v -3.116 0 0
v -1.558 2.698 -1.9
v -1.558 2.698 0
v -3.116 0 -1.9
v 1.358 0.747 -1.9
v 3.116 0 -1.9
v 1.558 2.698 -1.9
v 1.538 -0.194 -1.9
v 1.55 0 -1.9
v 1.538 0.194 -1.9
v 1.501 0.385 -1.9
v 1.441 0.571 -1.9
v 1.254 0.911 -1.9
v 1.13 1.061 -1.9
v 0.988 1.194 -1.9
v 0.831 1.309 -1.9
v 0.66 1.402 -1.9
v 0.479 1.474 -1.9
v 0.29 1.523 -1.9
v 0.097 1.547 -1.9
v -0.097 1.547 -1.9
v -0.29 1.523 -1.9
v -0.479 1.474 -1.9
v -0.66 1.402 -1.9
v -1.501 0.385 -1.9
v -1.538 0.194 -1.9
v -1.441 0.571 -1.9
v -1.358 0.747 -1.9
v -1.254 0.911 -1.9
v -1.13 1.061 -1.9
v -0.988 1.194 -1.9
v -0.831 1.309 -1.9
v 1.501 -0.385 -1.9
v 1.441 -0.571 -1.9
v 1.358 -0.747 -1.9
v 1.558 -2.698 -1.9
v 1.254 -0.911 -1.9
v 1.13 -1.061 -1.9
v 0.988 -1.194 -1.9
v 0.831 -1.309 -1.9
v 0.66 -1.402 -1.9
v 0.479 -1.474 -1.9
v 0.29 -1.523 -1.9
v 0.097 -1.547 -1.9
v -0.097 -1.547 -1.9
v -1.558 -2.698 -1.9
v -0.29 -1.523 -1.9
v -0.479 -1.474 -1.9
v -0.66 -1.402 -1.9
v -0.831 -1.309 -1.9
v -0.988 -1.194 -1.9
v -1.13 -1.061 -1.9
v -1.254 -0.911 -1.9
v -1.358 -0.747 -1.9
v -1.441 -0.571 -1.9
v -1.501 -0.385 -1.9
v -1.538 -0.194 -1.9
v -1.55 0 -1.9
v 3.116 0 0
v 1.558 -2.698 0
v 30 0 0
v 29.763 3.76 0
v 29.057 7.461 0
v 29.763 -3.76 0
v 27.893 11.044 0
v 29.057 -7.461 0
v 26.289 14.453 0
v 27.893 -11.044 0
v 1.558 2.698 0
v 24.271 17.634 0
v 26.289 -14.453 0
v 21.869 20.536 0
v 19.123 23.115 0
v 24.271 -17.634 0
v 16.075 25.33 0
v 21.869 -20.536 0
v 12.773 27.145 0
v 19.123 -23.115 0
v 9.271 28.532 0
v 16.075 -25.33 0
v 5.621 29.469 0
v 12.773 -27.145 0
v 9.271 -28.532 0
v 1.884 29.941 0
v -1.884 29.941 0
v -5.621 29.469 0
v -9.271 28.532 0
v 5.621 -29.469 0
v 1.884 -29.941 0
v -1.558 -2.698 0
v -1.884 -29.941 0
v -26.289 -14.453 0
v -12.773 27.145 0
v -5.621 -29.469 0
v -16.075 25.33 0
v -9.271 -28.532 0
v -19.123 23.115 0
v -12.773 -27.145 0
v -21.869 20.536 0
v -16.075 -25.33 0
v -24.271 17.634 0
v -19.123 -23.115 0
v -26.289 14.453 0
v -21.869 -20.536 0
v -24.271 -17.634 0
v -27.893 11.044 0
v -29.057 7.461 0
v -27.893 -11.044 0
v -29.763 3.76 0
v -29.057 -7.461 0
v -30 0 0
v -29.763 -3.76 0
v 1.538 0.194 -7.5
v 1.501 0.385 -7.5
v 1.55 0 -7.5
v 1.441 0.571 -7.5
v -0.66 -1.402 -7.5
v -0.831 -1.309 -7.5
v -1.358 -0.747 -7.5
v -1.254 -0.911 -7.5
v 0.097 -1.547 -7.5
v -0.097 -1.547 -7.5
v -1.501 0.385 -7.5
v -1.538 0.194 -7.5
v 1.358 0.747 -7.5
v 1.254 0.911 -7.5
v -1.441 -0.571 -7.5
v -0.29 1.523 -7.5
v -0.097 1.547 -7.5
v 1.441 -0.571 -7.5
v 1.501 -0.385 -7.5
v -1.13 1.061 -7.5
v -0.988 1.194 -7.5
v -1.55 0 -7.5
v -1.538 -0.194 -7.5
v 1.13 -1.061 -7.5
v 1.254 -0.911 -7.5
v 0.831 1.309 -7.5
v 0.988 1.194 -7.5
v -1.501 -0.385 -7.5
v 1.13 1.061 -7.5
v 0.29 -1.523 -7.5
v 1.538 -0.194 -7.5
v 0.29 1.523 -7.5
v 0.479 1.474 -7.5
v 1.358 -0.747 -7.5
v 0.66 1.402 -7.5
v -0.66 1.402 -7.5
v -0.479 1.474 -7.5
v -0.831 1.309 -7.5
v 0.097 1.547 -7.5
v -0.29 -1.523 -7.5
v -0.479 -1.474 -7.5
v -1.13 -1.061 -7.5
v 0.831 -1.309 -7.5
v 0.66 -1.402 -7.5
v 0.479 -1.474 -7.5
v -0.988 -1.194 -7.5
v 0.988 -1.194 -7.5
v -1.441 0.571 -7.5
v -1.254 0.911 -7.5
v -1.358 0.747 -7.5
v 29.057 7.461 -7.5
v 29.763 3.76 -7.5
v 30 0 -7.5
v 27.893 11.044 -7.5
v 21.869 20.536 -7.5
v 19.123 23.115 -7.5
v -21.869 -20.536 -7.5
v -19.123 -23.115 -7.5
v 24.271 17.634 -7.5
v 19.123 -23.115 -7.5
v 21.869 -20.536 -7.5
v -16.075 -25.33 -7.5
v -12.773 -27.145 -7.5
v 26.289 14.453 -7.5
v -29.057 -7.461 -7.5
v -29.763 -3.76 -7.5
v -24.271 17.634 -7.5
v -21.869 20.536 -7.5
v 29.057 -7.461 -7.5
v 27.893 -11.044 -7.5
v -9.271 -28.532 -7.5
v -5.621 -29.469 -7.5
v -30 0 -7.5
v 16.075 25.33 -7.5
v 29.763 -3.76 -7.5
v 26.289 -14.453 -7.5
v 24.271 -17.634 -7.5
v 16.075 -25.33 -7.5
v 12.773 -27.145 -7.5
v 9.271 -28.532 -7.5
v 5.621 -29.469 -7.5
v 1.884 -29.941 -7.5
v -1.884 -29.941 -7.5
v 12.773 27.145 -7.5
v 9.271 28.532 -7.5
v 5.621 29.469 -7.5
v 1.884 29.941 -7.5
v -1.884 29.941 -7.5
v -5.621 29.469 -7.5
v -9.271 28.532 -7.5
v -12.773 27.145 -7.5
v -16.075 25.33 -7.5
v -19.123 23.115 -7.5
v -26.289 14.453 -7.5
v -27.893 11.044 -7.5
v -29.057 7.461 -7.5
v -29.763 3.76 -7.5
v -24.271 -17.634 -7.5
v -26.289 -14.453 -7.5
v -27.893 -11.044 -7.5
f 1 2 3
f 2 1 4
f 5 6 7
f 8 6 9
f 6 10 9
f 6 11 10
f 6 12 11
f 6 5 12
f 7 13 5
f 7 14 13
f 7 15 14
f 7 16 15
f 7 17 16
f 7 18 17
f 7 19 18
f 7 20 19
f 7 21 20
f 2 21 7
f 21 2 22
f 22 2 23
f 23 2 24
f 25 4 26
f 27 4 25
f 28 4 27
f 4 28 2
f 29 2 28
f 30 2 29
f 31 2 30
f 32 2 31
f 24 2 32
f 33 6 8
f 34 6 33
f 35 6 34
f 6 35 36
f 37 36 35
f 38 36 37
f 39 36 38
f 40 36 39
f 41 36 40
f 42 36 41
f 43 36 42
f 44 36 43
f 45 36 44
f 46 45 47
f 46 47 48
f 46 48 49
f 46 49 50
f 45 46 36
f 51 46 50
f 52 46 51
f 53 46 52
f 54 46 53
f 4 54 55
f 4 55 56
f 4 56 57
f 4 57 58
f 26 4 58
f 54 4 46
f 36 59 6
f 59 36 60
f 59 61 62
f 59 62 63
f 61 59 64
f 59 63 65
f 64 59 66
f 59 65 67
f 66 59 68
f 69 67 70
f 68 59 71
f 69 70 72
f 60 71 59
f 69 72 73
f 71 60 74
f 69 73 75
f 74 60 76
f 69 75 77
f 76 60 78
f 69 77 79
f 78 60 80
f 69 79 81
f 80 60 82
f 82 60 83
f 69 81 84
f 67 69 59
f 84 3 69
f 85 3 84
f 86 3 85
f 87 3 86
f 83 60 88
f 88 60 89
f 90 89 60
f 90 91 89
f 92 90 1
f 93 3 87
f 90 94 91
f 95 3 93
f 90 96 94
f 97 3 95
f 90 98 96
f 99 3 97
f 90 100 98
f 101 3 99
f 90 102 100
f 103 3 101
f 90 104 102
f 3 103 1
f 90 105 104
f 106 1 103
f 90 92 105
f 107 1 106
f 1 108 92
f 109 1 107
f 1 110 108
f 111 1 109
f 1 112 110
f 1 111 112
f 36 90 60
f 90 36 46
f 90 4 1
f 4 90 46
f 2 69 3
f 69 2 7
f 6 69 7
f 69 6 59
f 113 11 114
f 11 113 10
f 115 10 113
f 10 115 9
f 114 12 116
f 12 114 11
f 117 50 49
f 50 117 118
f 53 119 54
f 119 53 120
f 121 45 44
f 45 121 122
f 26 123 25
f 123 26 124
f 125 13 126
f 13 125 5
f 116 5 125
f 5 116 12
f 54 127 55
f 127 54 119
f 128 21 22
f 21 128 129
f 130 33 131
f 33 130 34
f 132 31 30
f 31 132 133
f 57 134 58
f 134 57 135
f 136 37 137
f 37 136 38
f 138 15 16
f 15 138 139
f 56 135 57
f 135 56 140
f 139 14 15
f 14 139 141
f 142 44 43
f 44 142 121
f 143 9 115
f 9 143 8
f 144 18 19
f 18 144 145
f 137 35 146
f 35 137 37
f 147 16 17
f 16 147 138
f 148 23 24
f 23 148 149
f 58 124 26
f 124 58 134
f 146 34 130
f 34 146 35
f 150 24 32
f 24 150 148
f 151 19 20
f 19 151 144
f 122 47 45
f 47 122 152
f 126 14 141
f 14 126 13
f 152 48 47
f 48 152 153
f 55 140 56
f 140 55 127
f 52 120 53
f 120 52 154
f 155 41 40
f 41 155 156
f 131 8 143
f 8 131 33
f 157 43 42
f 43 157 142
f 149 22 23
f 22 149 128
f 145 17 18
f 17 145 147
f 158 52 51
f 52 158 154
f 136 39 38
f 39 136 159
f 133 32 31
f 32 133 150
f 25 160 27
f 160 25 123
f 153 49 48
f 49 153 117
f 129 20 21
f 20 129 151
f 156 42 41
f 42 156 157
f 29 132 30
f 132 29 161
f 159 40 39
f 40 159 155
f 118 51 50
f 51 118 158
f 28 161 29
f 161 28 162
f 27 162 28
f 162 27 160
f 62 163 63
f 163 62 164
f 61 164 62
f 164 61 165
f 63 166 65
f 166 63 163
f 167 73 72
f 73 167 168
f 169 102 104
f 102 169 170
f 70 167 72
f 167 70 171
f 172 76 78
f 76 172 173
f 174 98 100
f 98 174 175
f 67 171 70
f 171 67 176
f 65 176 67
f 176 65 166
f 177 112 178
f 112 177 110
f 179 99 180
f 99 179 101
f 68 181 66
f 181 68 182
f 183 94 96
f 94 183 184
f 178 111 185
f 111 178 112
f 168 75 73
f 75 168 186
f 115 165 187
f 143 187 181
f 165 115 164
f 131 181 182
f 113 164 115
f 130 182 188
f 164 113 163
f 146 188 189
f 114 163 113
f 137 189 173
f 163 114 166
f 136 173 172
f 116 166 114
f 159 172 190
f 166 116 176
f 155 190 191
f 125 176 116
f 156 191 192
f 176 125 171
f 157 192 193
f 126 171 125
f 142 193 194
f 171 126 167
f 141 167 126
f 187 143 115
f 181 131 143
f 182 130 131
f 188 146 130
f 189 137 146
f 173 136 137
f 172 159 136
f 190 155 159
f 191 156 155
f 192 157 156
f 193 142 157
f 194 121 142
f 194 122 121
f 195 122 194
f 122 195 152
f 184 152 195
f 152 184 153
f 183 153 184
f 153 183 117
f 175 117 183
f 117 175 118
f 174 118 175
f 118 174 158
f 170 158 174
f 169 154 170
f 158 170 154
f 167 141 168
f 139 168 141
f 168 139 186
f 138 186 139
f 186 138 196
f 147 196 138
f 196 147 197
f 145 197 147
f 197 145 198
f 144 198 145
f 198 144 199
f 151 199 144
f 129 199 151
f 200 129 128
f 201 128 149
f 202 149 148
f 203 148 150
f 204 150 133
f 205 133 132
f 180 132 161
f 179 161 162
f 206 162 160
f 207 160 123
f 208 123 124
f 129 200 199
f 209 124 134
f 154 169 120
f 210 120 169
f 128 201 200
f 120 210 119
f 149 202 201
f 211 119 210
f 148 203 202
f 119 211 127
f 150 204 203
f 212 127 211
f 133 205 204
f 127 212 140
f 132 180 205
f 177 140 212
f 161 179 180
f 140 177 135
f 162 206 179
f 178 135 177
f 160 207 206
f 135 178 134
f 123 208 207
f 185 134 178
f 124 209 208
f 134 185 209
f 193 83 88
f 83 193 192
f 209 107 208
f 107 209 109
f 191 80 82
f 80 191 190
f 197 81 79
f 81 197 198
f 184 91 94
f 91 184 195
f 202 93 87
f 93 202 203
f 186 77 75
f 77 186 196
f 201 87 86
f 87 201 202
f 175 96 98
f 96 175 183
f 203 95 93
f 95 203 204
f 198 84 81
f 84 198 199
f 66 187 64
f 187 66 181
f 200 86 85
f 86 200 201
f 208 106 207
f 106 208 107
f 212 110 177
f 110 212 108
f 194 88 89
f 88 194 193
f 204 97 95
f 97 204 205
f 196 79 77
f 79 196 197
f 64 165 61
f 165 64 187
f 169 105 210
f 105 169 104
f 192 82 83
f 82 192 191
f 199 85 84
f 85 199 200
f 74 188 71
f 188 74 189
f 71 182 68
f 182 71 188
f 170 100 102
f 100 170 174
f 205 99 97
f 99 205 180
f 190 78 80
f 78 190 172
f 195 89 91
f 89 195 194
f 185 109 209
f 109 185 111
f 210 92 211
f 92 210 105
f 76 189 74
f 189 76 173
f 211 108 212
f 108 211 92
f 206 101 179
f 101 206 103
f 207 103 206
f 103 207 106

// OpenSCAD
$fn = 50;

difference() {
	union() {
		translate(v = [0, 0, -7.5]) {
			cylinder(h = 7.5, r = 30.0);
		}
	}
	union() {
		translate(v = [0, 0, 0]) {
			rotate(a = [0, 0, 0]) {
				difference() {
					union() {
						translate(v = [0, 0, -1.9]) {
							linear_extrude(height = 1.9) {
								polygon(points = [[3.1158, 0.0], [1.5579000000000005, 2.698361953111554], [-1.5578999999999994, 2.6983619531115544], [-3.1158, 3.815754496783323e-16], [-1.5579000000000014, -2.6983619531115535], [1.557899999999998, -2.6983619531115552]]);
							}
						}
					}
					union();
				}
			}
		}
		#translate(v = [0, 0, -100.0]) {
			cylinder(h = 200, r = 1.55);
		}
	}
}
